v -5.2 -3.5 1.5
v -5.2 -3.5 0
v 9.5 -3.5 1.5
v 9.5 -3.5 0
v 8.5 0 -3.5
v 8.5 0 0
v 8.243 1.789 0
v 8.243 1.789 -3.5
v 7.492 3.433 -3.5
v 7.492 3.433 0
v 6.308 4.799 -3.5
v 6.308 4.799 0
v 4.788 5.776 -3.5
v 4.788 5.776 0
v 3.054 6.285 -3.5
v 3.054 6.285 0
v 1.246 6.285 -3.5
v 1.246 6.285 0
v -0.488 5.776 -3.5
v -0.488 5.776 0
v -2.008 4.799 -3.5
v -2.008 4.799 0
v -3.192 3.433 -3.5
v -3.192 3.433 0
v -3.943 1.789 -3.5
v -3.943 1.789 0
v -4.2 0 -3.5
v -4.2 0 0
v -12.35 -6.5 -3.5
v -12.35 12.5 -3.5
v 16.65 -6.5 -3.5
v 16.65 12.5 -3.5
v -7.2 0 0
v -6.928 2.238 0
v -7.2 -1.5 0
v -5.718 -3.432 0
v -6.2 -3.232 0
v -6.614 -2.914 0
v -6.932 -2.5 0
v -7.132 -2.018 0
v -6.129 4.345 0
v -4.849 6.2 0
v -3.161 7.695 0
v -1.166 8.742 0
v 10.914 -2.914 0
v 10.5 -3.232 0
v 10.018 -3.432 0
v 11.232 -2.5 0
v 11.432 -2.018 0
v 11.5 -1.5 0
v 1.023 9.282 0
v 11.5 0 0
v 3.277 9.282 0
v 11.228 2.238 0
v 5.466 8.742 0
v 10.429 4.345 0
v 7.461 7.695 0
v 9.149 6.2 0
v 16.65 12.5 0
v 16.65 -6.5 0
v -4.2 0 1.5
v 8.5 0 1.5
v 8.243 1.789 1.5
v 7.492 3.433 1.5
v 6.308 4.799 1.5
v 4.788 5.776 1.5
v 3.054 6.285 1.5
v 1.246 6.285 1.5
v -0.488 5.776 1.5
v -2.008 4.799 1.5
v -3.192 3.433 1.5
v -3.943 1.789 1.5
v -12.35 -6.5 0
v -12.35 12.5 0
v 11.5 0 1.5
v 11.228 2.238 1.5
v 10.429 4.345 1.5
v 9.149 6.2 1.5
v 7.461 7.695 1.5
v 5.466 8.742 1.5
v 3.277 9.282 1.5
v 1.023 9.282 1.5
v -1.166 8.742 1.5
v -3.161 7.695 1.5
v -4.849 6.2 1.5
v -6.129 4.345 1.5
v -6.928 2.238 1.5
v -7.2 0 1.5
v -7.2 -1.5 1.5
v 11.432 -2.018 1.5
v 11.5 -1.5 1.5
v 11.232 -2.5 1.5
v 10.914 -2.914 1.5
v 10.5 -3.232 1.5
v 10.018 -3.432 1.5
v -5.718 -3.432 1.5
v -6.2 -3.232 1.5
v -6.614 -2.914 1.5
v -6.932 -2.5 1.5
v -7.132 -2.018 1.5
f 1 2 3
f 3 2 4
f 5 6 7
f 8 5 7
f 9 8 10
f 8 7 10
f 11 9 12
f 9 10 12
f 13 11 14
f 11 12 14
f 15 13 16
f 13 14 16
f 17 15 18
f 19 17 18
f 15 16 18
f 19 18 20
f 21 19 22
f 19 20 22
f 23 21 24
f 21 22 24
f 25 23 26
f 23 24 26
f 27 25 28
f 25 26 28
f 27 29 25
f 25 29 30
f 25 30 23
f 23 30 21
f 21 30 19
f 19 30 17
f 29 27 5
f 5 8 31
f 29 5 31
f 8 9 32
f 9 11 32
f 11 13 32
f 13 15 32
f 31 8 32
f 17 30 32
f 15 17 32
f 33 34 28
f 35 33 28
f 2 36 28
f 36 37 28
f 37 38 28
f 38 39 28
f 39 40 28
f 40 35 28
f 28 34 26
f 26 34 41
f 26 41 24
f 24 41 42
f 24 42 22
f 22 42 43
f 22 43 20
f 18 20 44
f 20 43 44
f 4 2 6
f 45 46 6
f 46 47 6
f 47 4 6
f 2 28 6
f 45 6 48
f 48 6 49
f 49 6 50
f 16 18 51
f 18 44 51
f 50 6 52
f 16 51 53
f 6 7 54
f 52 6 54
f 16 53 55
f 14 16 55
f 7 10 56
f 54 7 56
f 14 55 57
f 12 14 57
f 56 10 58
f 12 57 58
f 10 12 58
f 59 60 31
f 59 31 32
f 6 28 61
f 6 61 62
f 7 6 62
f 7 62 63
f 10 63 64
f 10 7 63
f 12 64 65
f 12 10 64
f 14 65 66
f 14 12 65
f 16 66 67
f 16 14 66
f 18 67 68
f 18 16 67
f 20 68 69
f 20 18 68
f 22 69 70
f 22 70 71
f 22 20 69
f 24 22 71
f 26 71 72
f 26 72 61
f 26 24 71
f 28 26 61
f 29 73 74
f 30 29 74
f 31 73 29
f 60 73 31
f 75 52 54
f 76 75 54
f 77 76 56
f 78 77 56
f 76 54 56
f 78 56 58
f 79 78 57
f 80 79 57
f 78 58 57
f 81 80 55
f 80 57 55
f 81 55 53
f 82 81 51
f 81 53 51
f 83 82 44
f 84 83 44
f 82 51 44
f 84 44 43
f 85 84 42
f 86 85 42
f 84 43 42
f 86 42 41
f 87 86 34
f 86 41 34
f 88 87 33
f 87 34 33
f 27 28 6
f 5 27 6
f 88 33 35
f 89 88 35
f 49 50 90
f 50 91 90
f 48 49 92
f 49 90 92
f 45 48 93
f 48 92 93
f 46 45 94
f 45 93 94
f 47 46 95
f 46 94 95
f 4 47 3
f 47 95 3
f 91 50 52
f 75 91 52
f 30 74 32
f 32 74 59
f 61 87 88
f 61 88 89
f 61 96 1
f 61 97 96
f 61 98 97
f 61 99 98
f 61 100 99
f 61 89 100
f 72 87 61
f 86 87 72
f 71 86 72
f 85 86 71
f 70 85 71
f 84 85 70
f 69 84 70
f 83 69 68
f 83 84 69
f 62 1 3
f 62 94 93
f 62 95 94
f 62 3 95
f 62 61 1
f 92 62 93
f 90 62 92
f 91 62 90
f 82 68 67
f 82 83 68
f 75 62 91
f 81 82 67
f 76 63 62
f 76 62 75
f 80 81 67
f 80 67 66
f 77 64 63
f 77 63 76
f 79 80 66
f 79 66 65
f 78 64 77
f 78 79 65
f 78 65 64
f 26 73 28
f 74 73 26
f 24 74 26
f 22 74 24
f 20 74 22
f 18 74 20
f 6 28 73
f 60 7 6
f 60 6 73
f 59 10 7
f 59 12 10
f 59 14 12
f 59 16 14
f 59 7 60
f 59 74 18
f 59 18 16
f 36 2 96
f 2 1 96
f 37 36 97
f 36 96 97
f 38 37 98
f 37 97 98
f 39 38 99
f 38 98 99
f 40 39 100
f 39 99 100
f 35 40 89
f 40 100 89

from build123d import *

# Parameters (mm, degrees)
CAP_ALIGNMENT_LIP_DEPTH = 1.5
SKETCH1_3_W             = 29
SKETCH1_3_H             = 19
CAP_BODY_DEPTH          = 3.5
LIP_CORNER_FILLET_R     = 2


with BuildPart() as part:
    # Sketch1 → cap alignment lip (new body)
    with BuildSketch(Plane.XY):
        with BuildLine():
            ThreePointArc((11.5, 0), (2.15, 9.35), (-7.2, 0))
            Line((-7.2, 0), (-7.2, -3.5))
            Line((-7.2, -3.5), (11.5, -3.5))
            Line((11.5, -3.5), (11.5, 0))
        make_face()
        with BuildLine():
            Line((8.5, 0), (-4.2, 0))
            ThreePointArc((-4.2, 0), (2.15, 6.35), (8.5, 0))
        make_face(mode=Mode.SUBTRACT)
    extrude(amount=CAP_ALIGNMENT_LIP_DEPTH)

    # lip corner fillet
    lip_corner_fillet_edges = [part.edges().sort_by_distance(p)[0] for p in [
        (-7.2, -3.5, 0.75),
        (11.5, -3.5, 0.75),
    ]]
    fillet(lip_corner_fillet_edges, radius=LIP_CORNER_FILLET_R)


with BuildPart() as body_2:
    # Sketch1<3> → cap body (new body)
    with BuildSketch(Plane.XY):
        with Locations((2.15, 3)):
            Rectangle(SKETCH1_3_W, SKETCH1_3_H)
        with BuildLine():
            Line((8.5, 0), (-4.2, 0))
            ThreePointArc((-4.2, 0), (2.15, 6.35), (8.5, 0))
        make_face(mode=Mode.SUBTRACT)
    extrude(amount=-CAP_BODY_DEPTH)


solid = Compound([part.part, body_2.part])
